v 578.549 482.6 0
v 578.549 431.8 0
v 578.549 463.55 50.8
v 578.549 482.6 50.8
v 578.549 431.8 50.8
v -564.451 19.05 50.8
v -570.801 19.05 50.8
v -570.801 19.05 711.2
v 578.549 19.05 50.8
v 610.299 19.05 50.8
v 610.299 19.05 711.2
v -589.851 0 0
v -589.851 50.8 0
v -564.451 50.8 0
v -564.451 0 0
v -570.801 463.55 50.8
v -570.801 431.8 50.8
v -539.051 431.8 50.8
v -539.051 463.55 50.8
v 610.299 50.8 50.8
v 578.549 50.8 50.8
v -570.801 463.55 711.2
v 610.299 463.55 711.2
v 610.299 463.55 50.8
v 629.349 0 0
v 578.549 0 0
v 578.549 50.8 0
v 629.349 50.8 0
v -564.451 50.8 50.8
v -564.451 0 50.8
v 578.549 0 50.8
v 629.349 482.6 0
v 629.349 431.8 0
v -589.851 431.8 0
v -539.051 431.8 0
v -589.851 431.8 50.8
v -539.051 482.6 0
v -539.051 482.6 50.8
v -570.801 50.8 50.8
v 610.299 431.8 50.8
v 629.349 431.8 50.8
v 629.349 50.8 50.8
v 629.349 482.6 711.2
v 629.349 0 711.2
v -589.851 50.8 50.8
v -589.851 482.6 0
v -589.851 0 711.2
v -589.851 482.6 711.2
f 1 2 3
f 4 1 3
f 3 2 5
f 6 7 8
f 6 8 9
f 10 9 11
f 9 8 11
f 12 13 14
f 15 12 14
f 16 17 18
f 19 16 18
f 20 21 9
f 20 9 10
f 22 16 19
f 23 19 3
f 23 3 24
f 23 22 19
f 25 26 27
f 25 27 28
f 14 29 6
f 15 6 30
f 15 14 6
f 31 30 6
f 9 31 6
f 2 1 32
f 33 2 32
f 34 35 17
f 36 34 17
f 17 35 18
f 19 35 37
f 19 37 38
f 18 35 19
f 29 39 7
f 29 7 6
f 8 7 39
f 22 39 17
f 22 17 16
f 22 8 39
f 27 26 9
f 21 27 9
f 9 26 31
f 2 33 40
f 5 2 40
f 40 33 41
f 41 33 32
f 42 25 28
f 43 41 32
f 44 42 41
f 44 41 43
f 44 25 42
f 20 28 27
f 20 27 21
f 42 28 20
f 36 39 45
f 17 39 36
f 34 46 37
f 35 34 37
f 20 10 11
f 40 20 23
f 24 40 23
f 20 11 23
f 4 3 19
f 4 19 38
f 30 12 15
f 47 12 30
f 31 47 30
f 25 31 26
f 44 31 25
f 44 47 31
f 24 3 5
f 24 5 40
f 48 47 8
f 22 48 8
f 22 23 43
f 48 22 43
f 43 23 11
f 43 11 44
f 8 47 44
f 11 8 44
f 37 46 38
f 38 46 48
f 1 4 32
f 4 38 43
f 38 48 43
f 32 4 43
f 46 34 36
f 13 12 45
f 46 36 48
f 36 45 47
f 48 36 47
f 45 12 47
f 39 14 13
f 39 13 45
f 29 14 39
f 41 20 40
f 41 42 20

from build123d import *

# Parameters (mm, degrees)
F0_W     = 1219.2
F0_H     = 711.2
F1_DEPTH = 482.6
F2_W     = 1117.6
F2_H     = 50.8
F3_DEPTH = 482.6
F4_W     = 381
F4_H     = 50.8
F5_DEPTH = 1219.2
F6_W     = 1181.1
F6_H     = 444.5
F7_DEPTH = 660.4
F8_W     = 25.4
F8_H     = 50.8
F9_DEPTH = 50.8


with BuildPart() as f1:
    # F0 (on Front) → F1 (new body)
    with BuildSketch(Plane.XZ):
        with Locations((19.749452, 355.6)):
            Rectangle(F0_W, F0_H)
    extrude(amount=-F1_DEPTH)

    # F2 (on face) → F3 (cut, through all)
    with BuildSketch(Plane.XZ):
        with Locations((19.749452, 25.4)):
            Rectangle(F2_W, F2_H)
    extrude(amount=-F3_DEPTH, mode=Mode.SUBTRACT)

    # F4 (on face) → F5 (cut, through all)
    with BuildSketch(Plane.YZ.offset(629.349452)):
        with Locations((241.3, 25.4)):
            Rectangle(F4_W, F4_H)
    extrude(amount=-F5_DEPTH, mode=Mode.SUBTRACT)

    # F6 (on face) → F7 (cut, through all)
    with BuildSketch(Plane.XY.offset(711.2)):
        with Locations((19.749452, 241.3)):
            Rectangle(F6_W, F6_H)
    extrude(amount=-F7_DEPTH, mode=Mode.SUBTRACT)

    # F8 (on face) → F9 (cut)
    with BuildSketch(Plane(origin=(0, 0, 0), x_dir=(1, 0, 0), z_dir=(0, 0, -1))):
        with Locations((-551.750548, -25.4)):
            Rectangle(F8_W, F8_H)
    extrude(amount=-F9_DEPTH, mode=Mode.SUBTRACT)


solid = f1.part
